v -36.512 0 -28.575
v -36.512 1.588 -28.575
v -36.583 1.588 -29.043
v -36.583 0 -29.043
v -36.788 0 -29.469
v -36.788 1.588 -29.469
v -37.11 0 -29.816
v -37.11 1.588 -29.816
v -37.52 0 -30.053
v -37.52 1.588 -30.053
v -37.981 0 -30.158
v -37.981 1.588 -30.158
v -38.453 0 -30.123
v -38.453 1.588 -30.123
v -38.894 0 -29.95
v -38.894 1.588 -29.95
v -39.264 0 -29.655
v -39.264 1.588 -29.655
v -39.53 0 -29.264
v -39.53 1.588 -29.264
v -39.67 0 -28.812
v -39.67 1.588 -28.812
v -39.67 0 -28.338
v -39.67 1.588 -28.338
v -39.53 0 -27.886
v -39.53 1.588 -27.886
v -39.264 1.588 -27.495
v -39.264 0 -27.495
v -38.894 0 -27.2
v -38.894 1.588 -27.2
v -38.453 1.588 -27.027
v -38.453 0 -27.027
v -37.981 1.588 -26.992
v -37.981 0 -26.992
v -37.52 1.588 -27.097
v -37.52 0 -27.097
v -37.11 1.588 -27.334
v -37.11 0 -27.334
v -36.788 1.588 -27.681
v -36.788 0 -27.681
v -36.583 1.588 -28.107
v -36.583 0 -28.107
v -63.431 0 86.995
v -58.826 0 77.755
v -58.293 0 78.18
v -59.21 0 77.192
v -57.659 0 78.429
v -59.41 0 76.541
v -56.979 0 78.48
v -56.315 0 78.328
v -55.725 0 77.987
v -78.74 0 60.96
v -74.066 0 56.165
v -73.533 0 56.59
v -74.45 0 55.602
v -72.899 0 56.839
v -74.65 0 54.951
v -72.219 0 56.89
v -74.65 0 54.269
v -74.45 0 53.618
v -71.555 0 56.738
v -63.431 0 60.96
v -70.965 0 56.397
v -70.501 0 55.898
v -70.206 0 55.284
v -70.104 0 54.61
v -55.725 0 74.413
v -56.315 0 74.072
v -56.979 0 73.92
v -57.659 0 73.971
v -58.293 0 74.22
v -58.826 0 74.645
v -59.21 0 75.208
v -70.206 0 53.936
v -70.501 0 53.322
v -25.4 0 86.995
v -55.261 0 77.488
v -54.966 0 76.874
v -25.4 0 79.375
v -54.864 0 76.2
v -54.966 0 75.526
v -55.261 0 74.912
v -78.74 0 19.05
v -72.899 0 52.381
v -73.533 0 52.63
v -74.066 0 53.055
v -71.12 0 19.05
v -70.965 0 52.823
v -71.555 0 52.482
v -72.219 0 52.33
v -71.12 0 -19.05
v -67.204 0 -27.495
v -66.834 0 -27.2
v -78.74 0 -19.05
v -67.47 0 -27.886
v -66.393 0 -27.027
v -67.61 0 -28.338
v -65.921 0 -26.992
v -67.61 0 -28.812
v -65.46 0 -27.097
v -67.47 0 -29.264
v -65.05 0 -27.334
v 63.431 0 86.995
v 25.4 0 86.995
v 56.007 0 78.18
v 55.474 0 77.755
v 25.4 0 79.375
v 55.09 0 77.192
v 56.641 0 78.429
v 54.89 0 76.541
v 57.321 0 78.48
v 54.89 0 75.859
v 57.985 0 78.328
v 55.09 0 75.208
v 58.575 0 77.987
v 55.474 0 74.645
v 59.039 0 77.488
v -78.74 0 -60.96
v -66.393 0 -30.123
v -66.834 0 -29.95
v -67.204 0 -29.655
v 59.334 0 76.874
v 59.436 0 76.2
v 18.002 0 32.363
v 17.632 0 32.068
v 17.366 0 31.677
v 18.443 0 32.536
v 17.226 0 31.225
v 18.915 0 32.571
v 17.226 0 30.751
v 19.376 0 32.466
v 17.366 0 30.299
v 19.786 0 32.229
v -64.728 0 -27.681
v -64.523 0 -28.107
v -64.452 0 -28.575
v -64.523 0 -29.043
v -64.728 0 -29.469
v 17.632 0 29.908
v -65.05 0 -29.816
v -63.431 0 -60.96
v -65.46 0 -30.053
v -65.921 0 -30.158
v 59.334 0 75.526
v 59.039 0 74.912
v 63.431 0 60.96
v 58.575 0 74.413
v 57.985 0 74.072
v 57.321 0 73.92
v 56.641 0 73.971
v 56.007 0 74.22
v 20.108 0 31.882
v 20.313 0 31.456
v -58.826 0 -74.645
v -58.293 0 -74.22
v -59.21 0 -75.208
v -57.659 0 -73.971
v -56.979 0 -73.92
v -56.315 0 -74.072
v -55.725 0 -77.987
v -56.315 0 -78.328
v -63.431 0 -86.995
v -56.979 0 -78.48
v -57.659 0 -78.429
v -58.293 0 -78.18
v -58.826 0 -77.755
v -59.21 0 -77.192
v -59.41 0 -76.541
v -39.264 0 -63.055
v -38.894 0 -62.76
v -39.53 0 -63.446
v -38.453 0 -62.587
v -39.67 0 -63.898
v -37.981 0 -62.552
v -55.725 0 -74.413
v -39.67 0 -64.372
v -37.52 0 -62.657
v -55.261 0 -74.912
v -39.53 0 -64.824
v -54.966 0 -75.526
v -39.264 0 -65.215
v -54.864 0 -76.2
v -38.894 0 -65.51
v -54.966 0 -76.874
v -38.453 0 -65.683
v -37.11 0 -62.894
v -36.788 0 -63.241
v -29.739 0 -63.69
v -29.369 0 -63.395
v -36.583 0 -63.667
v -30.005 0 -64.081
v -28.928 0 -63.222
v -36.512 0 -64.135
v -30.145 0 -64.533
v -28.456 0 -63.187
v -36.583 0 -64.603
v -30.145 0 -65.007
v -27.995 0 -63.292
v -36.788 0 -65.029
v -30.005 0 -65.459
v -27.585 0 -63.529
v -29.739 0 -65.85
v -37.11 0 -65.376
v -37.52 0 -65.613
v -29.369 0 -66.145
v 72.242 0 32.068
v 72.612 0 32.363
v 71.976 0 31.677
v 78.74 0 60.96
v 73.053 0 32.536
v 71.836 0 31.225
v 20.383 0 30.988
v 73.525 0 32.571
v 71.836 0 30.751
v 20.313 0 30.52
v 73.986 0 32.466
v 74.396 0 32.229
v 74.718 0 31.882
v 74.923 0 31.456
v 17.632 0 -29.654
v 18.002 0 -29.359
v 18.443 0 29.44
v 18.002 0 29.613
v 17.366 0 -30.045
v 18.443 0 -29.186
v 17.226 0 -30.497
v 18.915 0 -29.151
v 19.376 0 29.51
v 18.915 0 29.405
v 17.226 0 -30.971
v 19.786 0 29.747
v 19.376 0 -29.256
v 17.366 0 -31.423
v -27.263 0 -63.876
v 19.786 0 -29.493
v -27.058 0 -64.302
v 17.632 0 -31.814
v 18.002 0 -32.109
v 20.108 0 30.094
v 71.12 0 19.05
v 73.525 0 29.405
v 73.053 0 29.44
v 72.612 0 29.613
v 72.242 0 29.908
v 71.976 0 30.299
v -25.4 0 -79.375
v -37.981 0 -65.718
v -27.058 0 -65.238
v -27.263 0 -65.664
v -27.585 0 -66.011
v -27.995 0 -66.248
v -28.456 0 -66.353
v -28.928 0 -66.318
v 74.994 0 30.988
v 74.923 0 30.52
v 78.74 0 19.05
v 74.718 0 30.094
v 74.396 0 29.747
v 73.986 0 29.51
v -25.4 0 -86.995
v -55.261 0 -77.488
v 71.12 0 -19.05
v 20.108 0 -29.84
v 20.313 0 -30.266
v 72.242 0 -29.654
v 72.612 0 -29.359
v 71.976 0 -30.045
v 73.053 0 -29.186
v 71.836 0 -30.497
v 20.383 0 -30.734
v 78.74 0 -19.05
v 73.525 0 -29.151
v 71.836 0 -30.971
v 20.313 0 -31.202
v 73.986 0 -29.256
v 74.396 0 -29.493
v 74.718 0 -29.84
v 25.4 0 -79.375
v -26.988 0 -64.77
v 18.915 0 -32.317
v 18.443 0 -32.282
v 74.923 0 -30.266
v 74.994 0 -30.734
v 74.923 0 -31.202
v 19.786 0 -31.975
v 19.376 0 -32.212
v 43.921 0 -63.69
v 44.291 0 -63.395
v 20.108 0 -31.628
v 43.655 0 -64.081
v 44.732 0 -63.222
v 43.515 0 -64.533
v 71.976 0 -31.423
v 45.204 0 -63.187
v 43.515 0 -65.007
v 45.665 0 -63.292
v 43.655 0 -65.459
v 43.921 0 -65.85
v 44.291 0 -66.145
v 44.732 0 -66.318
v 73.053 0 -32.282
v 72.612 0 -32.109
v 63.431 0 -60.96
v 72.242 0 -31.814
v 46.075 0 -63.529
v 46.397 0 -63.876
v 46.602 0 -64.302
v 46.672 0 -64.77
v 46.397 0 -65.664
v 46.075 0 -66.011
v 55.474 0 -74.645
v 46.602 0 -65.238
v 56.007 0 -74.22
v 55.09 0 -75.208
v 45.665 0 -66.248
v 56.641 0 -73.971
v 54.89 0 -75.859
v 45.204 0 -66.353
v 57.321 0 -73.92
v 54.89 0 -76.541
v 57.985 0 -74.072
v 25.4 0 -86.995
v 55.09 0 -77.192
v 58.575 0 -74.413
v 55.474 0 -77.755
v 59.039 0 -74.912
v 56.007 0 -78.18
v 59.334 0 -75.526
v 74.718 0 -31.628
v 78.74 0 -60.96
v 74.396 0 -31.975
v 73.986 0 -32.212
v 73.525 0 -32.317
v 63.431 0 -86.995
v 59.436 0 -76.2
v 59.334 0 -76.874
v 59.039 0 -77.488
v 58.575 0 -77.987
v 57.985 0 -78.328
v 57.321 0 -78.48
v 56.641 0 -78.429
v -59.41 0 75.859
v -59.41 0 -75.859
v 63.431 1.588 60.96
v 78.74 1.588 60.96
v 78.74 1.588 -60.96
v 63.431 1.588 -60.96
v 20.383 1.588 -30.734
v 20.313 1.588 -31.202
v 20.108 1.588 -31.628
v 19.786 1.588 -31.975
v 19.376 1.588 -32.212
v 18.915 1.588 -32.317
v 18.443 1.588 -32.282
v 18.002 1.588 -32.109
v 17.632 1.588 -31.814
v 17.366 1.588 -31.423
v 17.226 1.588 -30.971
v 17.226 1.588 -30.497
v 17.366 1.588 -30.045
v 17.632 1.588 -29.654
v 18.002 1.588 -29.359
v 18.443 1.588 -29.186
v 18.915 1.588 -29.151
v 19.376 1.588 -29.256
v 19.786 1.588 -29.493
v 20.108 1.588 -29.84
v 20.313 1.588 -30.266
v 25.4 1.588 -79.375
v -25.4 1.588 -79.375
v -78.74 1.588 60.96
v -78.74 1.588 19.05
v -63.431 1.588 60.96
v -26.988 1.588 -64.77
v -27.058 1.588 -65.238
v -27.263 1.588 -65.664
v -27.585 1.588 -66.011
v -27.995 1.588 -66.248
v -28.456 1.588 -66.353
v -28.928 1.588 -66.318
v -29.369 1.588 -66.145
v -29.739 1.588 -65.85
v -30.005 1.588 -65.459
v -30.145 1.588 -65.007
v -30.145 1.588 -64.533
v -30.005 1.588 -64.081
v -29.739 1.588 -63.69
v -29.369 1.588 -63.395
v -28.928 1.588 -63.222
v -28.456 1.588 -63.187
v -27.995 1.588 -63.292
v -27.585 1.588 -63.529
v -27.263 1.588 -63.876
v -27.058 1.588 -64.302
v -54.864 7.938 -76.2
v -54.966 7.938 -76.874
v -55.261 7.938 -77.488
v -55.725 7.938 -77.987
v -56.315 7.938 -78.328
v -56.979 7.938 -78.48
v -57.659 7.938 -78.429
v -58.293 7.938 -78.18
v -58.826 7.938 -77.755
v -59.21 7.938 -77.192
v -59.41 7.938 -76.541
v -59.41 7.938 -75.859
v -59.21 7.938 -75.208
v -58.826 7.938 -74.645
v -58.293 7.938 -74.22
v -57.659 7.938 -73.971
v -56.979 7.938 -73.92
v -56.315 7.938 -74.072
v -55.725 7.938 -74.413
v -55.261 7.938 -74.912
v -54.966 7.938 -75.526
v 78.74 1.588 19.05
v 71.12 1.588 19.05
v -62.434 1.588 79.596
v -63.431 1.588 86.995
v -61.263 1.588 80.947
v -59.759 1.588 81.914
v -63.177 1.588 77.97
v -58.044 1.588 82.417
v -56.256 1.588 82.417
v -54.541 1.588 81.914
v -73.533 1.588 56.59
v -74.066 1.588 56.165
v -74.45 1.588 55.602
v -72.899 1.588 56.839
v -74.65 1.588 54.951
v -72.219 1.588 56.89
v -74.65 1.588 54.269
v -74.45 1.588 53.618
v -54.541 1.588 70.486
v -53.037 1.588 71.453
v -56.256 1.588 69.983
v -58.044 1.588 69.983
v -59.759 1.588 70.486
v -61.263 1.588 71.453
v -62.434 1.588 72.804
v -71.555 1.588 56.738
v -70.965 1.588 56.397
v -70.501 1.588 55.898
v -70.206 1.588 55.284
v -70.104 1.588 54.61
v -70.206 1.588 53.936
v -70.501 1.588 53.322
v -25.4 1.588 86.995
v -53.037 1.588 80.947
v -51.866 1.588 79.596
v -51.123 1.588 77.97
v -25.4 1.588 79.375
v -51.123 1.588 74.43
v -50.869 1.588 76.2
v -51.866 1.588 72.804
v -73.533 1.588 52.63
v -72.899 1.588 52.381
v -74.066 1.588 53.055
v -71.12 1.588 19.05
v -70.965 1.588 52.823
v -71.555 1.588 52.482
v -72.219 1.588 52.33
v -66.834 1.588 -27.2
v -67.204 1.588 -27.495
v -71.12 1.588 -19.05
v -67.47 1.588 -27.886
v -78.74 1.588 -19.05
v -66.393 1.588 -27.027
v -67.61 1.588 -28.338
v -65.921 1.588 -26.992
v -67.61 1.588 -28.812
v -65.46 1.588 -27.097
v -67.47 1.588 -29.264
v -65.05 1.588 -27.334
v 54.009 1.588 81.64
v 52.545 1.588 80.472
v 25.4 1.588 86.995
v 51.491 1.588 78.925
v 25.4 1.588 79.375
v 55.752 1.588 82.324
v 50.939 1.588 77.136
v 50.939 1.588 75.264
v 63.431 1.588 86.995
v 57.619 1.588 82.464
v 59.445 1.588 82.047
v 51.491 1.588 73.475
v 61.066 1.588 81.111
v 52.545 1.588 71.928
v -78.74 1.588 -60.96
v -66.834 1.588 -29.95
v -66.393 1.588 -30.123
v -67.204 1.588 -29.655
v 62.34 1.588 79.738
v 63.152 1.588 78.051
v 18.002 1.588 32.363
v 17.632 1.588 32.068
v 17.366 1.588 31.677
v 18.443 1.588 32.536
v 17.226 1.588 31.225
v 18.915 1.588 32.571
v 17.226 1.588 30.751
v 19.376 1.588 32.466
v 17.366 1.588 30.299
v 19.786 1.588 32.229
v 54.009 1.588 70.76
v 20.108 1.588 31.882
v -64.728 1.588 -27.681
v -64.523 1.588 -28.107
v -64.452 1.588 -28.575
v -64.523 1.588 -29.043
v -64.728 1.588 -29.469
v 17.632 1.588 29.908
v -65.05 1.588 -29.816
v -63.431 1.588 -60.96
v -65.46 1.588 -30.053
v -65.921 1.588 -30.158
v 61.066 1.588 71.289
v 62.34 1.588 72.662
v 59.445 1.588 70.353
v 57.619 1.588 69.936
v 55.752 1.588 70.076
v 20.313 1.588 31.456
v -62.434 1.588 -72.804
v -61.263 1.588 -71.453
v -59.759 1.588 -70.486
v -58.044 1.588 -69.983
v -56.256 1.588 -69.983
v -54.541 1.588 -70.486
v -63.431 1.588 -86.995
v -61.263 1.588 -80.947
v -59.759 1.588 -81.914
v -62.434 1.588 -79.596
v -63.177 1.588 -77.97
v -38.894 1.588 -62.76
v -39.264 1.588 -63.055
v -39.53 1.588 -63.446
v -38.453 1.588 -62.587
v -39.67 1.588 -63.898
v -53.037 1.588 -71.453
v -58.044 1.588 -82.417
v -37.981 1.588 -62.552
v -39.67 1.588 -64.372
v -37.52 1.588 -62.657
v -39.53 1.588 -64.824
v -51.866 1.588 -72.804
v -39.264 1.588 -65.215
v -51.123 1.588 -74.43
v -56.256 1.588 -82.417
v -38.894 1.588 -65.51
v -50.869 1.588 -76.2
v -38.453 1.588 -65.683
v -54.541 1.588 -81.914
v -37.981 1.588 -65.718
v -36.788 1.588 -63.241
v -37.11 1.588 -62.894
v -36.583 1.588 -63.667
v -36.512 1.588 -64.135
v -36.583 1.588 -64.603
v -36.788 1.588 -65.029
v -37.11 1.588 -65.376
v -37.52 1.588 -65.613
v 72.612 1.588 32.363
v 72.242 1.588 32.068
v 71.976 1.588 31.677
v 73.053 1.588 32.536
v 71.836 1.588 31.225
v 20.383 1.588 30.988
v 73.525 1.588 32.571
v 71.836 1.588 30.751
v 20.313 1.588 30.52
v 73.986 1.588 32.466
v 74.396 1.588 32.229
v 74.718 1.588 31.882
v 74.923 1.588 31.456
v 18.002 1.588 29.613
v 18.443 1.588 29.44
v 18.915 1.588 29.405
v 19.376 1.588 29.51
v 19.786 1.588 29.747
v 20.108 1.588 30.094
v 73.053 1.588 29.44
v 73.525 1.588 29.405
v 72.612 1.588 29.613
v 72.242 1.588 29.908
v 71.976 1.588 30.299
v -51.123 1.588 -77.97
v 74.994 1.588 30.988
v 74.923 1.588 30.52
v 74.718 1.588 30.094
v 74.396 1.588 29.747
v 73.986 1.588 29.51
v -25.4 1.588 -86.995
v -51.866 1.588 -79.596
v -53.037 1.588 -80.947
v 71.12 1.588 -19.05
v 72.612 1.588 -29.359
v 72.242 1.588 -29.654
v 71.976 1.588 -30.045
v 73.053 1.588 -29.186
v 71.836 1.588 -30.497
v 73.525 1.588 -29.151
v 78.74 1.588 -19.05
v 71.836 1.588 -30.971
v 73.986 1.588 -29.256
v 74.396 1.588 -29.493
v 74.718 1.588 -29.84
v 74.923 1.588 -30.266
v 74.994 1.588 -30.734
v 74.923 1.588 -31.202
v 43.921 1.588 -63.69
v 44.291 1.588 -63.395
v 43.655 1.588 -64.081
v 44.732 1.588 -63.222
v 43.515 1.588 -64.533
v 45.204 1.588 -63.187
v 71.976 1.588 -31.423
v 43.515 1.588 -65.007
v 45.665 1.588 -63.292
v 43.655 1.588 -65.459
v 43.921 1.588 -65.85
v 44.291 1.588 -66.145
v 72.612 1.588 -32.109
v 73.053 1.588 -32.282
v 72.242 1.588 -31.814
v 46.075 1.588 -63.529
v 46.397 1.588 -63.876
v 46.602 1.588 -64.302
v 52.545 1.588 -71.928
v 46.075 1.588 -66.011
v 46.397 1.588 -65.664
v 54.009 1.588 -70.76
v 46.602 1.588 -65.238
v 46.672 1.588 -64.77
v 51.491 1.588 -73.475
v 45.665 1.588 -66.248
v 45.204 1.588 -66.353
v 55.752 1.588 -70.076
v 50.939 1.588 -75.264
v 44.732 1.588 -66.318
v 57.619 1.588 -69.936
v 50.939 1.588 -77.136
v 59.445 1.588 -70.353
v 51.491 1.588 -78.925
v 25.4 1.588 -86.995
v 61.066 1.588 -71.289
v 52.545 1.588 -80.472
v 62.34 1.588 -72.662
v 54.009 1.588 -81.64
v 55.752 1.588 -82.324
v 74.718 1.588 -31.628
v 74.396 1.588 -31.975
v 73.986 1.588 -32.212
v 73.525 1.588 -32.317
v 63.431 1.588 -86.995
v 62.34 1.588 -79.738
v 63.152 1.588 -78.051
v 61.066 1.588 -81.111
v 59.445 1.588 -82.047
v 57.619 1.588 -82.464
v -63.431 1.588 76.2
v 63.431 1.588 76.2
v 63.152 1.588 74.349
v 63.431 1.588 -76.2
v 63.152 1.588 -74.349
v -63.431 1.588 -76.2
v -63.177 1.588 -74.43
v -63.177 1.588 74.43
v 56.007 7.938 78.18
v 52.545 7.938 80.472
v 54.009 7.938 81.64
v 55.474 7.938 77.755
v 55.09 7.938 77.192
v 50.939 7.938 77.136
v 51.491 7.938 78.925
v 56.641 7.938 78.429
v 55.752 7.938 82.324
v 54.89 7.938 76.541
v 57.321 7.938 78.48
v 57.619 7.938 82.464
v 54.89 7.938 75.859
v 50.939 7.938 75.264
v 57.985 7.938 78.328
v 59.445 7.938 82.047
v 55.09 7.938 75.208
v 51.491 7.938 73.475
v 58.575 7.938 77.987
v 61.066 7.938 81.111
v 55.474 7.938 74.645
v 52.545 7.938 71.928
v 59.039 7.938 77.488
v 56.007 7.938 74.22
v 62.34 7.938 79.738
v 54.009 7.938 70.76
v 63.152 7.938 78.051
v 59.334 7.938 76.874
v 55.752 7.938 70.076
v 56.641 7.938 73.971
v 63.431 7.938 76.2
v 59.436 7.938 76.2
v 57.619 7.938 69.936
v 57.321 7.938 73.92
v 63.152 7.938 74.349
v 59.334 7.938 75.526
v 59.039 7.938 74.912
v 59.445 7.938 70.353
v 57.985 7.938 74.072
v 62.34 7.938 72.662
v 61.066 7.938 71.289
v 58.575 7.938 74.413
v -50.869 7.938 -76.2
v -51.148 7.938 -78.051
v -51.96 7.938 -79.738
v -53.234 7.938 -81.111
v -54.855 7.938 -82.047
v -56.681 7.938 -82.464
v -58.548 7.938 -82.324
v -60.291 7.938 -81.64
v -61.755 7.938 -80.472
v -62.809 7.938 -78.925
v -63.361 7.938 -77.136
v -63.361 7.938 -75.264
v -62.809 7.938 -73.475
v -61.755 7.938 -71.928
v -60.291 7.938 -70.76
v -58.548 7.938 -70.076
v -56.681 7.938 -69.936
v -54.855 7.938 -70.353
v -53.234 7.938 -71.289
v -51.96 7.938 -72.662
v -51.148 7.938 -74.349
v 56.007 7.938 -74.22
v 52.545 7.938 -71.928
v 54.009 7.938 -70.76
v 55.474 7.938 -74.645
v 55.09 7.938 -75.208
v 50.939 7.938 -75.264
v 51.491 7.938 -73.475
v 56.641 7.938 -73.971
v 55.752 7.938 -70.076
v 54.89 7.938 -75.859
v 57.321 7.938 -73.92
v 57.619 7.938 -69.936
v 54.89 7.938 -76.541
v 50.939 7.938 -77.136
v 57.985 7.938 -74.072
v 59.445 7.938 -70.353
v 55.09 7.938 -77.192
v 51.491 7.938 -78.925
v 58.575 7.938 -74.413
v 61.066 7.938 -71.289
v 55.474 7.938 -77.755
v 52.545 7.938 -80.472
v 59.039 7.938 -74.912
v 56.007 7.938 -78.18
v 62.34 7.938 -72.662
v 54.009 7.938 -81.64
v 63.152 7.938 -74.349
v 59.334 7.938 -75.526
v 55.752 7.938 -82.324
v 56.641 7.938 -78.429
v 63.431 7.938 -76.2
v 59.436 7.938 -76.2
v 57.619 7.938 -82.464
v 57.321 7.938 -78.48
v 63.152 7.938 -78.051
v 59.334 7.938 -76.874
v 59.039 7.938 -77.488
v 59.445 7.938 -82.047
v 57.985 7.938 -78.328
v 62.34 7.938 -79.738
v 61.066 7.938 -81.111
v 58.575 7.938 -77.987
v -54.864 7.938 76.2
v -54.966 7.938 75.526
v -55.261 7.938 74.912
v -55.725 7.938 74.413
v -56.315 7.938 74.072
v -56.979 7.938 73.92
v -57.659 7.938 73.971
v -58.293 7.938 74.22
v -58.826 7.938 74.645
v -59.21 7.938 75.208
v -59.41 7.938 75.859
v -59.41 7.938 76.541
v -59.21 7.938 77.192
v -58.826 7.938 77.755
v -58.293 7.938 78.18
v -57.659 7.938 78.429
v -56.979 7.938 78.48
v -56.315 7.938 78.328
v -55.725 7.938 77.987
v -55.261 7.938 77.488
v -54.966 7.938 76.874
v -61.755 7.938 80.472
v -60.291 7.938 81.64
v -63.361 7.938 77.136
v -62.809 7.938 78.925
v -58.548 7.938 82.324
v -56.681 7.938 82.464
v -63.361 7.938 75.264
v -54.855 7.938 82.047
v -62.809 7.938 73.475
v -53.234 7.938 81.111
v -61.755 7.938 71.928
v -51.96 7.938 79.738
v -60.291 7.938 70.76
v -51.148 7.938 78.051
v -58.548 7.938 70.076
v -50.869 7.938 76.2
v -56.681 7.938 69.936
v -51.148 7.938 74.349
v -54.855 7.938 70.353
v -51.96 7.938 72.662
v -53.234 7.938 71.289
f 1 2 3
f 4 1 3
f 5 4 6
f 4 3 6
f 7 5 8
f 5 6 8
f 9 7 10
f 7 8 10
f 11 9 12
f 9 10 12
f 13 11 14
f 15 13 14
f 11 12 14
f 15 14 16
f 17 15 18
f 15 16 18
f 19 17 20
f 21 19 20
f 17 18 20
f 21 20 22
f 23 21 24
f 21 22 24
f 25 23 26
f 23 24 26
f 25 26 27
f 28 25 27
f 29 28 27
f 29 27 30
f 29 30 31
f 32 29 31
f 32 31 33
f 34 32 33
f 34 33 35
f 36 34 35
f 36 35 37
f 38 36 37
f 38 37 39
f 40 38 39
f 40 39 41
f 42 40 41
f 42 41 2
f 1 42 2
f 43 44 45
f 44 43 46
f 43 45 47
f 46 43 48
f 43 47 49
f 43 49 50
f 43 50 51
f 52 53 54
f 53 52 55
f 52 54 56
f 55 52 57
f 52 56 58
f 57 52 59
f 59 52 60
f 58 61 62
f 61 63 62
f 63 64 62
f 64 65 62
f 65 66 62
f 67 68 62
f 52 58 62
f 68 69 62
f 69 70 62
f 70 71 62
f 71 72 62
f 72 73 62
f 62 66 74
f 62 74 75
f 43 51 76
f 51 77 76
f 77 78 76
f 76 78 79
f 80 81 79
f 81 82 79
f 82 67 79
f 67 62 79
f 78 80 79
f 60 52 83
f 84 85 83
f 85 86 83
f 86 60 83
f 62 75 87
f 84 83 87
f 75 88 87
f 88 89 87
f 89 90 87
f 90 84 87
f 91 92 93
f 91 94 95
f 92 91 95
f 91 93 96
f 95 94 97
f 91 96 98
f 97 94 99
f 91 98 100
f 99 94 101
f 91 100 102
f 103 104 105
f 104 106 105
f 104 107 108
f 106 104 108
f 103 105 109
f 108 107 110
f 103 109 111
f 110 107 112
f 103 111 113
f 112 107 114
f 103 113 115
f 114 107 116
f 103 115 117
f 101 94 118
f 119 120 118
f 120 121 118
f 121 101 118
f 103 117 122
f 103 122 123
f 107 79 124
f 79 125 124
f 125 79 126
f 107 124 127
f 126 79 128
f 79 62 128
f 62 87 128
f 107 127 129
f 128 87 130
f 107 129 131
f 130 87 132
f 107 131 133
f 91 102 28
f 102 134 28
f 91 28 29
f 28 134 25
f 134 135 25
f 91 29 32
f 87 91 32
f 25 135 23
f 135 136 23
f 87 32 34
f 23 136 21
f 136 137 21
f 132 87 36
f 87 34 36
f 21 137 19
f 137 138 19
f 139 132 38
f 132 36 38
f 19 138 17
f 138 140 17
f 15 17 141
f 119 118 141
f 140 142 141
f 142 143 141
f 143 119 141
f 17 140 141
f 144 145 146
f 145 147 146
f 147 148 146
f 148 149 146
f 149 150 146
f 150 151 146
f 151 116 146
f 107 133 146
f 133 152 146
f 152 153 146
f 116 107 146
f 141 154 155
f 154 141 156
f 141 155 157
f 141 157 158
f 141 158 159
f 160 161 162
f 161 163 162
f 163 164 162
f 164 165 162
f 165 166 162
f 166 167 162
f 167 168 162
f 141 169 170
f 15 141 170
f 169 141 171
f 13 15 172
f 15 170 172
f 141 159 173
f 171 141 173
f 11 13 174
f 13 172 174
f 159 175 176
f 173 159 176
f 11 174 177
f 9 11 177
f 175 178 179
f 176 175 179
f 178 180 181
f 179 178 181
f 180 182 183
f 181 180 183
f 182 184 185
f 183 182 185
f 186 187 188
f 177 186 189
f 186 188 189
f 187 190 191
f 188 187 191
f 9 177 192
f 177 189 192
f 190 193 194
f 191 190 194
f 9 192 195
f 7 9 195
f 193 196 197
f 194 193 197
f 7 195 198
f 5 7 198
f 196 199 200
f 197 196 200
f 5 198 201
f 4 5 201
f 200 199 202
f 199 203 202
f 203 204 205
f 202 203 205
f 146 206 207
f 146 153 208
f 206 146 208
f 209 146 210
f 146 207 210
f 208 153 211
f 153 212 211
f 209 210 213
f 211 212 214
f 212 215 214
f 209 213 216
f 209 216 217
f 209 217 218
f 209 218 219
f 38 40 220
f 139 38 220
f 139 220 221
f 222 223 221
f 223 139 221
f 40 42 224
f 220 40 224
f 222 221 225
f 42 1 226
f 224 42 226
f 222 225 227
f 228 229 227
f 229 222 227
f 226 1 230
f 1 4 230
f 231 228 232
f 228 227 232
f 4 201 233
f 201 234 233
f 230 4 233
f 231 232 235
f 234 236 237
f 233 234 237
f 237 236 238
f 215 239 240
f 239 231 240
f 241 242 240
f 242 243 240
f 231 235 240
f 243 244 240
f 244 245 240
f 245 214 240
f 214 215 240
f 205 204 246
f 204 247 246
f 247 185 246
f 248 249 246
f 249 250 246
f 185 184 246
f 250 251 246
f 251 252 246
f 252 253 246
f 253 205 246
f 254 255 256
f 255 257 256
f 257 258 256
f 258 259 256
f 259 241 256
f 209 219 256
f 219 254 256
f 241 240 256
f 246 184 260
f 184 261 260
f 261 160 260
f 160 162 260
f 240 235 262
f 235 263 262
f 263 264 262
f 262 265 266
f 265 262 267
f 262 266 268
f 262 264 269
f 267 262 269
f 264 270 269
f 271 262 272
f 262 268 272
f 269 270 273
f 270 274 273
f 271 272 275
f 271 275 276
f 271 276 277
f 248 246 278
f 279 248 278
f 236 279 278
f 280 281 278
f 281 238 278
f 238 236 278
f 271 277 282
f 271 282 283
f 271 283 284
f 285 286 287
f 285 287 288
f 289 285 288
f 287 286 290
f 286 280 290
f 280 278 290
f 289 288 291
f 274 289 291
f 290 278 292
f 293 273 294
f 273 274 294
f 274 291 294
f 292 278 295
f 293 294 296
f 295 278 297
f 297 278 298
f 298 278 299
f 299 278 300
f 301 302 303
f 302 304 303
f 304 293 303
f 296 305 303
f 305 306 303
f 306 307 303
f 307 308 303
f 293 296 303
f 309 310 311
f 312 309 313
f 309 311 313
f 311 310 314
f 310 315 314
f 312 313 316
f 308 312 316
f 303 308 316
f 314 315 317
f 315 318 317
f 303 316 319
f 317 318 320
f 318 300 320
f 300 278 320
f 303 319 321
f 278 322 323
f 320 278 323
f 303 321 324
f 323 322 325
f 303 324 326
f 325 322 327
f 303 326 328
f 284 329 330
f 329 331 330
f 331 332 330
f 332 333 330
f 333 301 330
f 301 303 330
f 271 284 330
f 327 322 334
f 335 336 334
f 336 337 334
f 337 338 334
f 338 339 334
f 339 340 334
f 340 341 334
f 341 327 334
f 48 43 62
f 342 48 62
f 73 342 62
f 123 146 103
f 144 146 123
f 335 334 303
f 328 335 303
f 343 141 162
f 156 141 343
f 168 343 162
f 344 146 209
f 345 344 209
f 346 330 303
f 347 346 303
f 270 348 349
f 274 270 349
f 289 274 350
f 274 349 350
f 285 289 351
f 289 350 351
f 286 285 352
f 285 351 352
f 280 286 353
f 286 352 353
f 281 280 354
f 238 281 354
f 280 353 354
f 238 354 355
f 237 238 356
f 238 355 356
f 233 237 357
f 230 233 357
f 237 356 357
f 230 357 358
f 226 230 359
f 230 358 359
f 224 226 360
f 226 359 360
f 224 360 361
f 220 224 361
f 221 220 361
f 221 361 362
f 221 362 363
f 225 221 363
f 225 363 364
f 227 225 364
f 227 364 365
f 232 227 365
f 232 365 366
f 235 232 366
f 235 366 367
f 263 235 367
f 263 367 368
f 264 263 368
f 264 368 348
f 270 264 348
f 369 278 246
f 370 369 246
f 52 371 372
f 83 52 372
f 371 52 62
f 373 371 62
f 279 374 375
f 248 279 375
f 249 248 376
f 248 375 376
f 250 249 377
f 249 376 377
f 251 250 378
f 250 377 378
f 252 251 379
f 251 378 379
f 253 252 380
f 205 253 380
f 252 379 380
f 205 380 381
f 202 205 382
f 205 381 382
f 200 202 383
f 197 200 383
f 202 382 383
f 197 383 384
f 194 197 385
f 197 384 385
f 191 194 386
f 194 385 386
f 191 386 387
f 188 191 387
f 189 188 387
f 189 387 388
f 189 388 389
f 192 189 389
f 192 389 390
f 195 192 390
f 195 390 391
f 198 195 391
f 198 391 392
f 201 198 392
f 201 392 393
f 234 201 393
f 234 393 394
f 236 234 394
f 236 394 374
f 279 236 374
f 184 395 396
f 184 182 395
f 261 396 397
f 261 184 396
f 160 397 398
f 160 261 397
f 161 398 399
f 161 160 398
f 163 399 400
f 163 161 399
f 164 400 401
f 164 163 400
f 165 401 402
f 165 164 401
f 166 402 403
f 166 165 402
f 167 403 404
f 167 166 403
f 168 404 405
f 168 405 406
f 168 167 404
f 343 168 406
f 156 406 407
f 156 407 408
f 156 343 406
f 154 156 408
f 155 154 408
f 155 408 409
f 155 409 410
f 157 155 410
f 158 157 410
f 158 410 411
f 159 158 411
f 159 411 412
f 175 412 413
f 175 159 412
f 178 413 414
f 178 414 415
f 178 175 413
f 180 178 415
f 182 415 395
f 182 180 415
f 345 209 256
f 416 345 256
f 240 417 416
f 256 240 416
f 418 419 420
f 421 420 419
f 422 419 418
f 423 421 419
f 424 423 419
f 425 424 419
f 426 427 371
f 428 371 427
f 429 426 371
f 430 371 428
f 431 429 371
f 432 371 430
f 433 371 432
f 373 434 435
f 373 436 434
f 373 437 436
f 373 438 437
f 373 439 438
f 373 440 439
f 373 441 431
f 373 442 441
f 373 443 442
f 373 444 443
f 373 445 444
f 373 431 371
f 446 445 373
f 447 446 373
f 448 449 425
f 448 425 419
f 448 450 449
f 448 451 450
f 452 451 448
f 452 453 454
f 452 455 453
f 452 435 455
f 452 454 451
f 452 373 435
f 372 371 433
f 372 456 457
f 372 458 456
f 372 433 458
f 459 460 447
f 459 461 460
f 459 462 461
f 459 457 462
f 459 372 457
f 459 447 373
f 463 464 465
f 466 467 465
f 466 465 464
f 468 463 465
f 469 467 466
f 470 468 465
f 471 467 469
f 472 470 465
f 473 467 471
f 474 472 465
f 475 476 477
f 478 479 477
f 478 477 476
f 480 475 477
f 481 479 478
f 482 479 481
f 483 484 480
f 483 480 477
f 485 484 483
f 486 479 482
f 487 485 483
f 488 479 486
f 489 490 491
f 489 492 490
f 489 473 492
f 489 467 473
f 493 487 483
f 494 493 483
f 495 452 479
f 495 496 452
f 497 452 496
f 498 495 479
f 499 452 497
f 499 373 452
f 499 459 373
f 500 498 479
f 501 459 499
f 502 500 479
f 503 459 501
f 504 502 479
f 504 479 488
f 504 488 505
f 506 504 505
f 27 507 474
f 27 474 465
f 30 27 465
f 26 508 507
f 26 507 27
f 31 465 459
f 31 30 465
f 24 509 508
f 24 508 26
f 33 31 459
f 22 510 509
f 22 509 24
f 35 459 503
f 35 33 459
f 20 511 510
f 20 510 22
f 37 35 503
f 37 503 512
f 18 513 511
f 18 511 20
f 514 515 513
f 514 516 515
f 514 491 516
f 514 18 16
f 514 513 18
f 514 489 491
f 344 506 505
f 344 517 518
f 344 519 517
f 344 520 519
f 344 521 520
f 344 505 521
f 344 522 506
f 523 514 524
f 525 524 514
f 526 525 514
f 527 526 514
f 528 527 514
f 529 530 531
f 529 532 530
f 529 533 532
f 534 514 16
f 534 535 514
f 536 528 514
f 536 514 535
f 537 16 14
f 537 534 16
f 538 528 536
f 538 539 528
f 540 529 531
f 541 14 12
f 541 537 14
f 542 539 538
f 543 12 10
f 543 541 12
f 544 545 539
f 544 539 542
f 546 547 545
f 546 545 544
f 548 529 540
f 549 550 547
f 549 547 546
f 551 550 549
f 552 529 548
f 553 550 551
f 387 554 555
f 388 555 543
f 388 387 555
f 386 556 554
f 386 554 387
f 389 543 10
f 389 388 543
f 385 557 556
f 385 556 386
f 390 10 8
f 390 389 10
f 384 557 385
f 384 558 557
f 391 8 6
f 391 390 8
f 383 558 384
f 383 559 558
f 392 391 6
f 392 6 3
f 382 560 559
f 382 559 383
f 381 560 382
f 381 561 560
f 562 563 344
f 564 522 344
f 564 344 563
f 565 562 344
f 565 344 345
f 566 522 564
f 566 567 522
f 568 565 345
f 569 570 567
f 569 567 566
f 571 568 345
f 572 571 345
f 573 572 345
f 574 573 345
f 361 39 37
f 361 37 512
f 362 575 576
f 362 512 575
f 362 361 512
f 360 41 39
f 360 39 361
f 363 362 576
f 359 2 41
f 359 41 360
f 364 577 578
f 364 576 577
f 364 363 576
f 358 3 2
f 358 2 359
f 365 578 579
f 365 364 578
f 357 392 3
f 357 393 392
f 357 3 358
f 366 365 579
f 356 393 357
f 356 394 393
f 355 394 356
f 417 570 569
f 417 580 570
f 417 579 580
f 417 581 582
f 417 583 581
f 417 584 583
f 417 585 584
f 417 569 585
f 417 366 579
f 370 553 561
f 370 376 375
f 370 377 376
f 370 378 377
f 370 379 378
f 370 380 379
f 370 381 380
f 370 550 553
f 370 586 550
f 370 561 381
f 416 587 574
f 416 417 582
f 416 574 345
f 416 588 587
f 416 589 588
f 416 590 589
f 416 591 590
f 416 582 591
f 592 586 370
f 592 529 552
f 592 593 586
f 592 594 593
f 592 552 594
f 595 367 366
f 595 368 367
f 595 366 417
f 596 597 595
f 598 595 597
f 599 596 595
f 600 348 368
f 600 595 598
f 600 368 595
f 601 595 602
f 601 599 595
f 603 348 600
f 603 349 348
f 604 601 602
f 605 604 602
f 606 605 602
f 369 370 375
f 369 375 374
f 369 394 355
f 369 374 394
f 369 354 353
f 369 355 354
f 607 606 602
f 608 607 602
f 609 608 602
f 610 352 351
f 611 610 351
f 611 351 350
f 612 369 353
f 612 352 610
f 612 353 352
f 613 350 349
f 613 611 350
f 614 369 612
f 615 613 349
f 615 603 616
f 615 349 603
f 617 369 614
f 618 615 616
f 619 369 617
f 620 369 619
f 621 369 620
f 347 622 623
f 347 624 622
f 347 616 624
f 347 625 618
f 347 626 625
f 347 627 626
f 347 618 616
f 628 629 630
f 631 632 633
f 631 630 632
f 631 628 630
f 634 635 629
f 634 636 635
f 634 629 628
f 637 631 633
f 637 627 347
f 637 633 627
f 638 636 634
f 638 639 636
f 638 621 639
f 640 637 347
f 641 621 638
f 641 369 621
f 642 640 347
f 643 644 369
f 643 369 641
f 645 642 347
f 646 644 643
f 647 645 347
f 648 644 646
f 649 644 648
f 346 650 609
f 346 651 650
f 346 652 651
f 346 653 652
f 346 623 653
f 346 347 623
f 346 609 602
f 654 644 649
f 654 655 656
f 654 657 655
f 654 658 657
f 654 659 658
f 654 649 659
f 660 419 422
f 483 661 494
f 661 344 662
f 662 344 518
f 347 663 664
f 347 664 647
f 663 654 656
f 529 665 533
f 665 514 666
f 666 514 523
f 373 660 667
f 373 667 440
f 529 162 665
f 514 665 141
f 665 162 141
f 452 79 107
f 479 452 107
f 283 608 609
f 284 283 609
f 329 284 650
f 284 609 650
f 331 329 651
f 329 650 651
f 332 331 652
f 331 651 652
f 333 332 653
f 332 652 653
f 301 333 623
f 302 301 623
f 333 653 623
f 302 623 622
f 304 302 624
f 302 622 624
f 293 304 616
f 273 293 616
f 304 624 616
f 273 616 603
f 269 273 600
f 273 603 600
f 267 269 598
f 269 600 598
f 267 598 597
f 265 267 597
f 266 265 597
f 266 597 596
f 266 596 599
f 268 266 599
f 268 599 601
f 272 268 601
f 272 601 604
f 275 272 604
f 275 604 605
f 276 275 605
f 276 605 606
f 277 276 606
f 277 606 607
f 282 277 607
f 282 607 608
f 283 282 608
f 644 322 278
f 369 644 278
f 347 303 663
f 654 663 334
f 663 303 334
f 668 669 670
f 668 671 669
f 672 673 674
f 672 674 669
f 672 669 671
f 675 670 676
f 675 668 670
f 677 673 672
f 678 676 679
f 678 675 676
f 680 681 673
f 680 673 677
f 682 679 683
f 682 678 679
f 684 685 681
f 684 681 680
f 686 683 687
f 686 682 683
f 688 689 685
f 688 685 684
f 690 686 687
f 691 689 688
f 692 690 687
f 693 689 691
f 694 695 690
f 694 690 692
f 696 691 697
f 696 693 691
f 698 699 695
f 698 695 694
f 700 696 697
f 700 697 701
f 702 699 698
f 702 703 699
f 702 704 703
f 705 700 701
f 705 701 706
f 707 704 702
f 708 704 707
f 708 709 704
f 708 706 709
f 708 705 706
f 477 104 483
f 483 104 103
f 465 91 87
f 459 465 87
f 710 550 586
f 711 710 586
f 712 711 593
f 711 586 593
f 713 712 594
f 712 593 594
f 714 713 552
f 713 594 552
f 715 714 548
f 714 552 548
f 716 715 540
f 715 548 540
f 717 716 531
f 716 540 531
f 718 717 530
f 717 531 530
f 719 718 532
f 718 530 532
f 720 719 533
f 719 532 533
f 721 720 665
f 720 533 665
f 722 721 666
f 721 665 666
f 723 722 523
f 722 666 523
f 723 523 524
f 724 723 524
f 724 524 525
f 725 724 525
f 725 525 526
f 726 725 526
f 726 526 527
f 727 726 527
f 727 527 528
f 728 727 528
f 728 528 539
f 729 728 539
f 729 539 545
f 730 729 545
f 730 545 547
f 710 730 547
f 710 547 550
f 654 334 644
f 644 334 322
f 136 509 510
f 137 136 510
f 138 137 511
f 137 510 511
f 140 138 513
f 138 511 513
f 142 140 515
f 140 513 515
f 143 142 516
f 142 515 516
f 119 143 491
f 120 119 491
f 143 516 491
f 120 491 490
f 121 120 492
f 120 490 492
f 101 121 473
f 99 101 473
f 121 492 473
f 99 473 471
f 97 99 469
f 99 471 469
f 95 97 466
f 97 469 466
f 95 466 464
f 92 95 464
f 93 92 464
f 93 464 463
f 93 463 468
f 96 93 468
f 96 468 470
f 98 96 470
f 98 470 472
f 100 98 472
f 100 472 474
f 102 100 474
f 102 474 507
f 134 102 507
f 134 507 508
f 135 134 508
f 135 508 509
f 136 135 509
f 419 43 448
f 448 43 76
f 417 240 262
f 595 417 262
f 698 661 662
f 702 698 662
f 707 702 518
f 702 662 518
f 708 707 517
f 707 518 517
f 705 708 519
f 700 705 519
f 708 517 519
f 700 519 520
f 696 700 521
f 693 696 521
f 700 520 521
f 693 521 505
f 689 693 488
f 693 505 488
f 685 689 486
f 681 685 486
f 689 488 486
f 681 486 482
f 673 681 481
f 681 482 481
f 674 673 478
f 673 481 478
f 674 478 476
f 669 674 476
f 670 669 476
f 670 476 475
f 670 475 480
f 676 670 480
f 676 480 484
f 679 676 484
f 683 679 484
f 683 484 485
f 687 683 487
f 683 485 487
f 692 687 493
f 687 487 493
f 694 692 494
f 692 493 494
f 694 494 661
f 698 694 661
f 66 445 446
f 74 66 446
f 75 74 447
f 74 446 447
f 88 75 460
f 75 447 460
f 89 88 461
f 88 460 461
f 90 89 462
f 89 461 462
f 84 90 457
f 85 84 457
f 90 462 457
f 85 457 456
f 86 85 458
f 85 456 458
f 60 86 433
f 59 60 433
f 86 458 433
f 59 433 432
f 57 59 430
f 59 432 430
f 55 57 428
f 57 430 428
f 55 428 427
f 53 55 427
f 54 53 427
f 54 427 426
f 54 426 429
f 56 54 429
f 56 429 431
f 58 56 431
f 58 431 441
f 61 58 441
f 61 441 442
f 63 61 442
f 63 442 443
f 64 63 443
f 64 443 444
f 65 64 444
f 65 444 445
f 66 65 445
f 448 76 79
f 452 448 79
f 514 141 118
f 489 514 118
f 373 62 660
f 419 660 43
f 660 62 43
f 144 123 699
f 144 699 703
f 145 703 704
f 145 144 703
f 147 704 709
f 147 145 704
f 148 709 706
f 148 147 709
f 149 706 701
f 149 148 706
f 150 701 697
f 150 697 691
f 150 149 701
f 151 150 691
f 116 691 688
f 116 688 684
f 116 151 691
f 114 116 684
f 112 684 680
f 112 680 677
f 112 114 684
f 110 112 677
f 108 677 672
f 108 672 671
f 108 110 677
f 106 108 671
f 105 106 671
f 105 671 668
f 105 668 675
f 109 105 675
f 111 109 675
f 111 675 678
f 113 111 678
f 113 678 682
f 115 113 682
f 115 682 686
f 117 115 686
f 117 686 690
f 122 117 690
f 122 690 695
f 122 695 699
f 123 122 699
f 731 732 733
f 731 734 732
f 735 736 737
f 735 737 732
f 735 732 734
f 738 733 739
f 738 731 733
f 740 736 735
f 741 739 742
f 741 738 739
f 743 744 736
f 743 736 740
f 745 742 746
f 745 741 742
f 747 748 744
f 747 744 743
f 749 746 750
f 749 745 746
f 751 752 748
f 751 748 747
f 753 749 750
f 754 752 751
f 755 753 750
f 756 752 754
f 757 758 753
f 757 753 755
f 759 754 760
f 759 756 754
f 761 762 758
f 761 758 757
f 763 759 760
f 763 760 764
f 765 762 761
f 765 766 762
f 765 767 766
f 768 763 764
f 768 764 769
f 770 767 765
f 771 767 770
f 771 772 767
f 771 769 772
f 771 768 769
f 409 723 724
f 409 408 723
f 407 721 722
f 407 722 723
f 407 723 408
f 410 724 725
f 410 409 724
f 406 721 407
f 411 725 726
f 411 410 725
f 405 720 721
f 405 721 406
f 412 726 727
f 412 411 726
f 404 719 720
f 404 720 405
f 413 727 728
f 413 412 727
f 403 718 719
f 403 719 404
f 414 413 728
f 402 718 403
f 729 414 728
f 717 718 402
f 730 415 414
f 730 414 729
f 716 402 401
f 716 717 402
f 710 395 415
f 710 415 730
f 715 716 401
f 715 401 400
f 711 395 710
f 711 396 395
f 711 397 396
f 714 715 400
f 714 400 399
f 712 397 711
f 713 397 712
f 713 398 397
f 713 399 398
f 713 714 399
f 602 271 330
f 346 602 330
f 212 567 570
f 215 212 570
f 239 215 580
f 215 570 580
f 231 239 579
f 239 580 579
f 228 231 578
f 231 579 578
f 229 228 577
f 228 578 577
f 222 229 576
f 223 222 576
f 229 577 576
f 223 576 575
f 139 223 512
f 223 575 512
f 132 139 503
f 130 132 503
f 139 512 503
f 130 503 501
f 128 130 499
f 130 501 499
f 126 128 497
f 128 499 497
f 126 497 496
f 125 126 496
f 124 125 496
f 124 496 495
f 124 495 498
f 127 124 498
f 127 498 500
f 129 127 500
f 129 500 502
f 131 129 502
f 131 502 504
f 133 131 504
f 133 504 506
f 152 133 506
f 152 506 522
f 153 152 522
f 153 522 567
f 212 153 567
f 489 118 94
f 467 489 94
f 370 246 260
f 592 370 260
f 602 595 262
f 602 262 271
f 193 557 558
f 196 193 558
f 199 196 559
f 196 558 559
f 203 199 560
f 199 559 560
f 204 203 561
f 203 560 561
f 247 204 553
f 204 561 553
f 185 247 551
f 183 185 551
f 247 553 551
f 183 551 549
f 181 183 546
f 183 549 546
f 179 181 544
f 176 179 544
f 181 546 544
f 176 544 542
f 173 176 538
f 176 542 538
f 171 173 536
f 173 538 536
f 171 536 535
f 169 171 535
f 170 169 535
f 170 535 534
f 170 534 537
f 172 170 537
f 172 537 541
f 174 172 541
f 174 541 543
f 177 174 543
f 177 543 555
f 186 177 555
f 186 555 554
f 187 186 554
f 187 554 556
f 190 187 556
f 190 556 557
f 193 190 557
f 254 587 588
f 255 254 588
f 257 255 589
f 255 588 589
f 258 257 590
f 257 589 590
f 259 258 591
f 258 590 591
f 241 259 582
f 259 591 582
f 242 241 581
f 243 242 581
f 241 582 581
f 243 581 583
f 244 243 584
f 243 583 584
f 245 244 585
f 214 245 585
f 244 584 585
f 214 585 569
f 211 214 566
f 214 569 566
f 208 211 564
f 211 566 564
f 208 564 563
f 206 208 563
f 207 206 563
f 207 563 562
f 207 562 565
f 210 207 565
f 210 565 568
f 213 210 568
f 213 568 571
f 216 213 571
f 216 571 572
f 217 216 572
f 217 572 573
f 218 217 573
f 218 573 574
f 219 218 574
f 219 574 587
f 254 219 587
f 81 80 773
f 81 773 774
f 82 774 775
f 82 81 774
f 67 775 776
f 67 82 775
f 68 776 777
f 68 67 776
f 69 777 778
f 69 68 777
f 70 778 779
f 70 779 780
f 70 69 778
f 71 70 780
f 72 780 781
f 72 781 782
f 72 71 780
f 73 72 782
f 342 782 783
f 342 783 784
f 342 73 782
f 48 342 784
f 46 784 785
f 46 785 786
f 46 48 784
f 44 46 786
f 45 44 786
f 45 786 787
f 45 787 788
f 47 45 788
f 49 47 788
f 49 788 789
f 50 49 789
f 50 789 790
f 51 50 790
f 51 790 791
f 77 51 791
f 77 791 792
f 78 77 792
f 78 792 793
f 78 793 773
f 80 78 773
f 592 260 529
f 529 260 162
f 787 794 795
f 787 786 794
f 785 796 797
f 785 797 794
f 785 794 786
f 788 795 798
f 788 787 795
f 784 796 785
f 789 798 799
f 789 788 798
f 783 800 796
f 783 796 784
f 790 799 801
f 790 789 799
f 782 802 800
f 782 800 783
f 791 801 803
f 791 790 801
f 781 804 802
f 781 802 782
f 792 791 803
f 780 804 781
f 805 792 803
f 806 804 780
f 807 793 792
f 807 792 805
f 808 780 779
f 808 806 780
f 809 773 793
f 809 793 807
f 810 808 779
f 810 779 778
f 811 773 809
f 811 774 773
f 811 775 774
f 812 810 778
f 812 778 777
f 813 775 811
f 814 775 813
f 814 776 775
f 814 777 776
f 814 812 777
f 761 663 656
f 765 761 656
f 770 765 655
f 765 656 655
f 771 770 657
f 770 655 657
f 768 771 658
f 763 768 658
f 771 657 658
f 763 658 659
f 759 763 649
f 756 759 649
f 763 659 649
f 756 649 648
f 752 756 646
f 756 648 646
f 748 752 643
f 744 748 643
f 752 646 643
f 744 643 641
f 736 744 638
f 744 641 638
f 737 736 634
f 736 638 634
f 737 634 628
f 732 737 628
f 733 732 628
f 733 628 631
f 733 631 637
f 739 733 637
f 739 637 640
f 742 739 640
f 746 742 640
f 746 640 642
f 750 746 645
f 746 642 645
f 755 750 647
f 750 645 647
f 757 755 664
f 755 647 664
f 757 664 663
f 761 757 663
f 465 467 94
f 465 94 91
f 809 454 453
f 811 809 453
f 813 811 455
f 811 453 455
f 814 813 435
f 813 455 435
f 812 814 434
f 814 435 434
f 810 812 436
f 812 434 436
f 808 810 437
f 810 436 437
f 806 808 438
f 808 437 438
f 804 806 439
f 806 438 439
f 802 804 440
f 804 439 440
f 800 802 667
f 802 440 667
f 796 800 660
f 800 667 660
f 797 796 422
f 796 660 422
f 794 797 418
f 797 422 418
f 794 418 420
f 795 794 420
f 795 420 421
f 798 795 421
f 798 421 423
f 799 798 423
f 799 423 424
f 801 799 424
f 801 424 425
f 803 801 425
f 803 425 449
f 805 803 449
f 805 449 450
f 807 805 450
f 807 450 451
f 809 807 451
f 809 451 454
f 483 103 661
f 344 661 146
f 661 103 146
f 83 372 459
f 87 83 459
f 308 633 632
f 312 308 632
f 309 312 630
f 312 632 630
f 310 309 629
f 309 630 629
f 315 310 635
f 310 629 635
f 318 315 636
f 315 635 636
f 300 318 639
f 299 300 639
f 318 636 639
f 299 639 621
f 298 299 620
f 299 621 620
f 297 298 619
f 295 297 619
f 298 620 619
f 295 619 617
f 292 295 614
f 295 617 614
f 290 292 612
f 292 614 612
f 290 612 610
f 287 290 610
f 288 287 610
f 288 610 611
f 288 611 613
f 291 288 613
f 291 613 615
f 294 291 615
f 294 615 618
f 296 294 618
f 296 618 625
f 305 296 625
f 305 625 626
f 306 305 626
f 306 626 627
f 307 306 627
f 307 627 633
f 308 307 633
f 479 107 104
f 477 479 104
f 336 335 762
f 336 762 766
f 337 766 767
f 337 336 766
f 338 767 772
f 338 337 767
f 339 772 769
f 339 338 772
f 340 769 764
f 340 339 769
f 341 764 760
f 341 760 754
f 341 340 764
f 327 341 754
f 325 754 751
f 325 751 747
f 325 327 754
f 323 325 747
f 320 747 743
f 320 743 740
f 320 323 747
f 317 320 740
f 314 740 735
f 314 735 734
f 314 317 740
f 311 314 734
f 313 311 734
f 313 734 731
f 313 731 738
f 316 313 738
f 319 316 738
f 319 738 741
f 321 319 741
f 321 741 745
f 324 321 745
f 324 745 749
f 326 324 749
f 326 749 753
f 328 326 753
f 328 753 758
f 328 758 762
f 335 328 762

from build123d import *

# Parameters (mm, degrees)
SKETCH1_R            = 2.286
MAIN_BODY_DEPTH      = 1.5875
SKETCH13_R           = 6.28142
SKETCH13_R_2         = 2.286
BOSS_EXTRUDE9_DEPTH  = 6.35
CUT_EXTRUDE3_REACH   = 3.587
SKETCH5_R            = 1.5875
SKETCH5_R_2          = 2.286
SKETCH14_W           = 7.62
SKETCH14_H           = 6.35
BOSS_EXTRUDE10_DEPTH = 1.5875


with BuildPart() as part:
    # Sketch1 → Main Body (new body)
    with BuildSketch(Plane(origin=(0, 0, 0), x_dir=(1, 0, 0), z_dir=(0, 1, 0))):
        Polygon((-25.4, 86.995), (-63.43142, 86.995), (-63.43142, 60.96), (-78.74, 60.96), (-78.74, 25.4), (-71.12, 25.4), (-71.12, -25.4), (-78.74, -25.4), (-78.74, -60.96), (-63.43142, -60.96), (-63.43142, -86.995), (-25.4, -86.995), (-25.4, -79.375), (25.4, -79.375), (25.4, -86.995), (63.43142, -86.995), (63.43142, -60.96), (78.74, -60.96), (78.74, -25.4), (71.12, -25.4), (71.12, 25.4), (78.74, 25.4), (78.74, 60.96), (63.43142, 60.96), (63.43142, 86.995), (25.4, 86.995), (25.4, 79.375), (-25.4, 79.375), align=None)
        with Locations((-57.15, 76.2)):
            Circle(SKETCH1_R, mode=Mode.SUBTRACT)
        with Locations((57.15, 76.2)):
            Circle(SKETCH1_R, mode=Mode.SUBTRACT)
        with Locations((57.15, -76.2)):
            Circle(SKETCH1_R, mode=Mode.SUBTRACT)
        with Locations((-57.15, -76.2)):
            Circle(SKETCH1_R, mode=Mode.SUBTRACT)
    extrude(amount=MAIN_BODY_DEPTH)

    # Sketch13 → Boss-Extrude9 (add)
    with BuildSketch(Plane(origin=(0, 1.5875, 0), x_dir=(1, 0, 0), z_dir=(0, 1, 0))):
        with Locations((-57.15, 76.2)):
            Circle(SKETCH13_R)
        with Locations((-57.15, 76.2)):
            Circle(SKETCH13_R_2, mode=Mode.SUBTRACT)
        with Locations((-57.15, -76.2)):
            Circle(SKETCH13_R)
        with Locations((-57.15, -76.2)):
            Circle(SKETCH13_R_2, mode=Mode.SUBTRACT)
        with Locations((57.15, -76.2)):
            Circle(SKETCH13_R)
        with Locations((57.15, -76.2)):
            Circle(SKETCH13_R_2, mode=Mode.SUBTRACT)
        with Locations((57.15, 76.2)):
            Circle(SKETCH13_R)
        with Locations((57.15, 76.2)):
            Circle(SKETCH13_R_2, mode=Mode.SUBTRACT)
    extrude(amount=BOSS_EXTRUDE9_DEPTH)

    # Sketch5 → Cut-Extrude3 (cut, up to next)
    with BuildSketch(Plane(origin=(0, 1.5875, 0), x_dir=(1, 0, 0), z_dir=(0, 1, 0)), mode=Mode.PRIVATE) as cut_extrude3_sk1:
        with Locations((18.796, 30.734)):
            Circle(SKETCH5_R)
    cut_extrude3_tool1 = extrude(cut_extrude3_sk1.sketch, amount=-CUT_EXTRUDE3_REACH, mode=Mode.PRIVATE) & part.part
    add(cut_extrude3_tool1.solids().sort_by_distance((18.796, 1.5875, -30.734))[0], mode=Mode.SUBTRACT)
    # Sketch5 → Cut-Extrude3 (cut, up to next)
    with BuildSketch(Plane(origin=(0, 1.5875, 0), x_dir=(1, 0, 0), z_dir=(0, 1, 0)), mode=Mode.PRIVATE) as cut_extrude3_sk2:
        with Locations((73.406, 30.734)):
            Circle(SKETCH5_R)
    cut_extrude3_tool2 = extrude(cut_extrude3_sk2.sketch, amount=-CUT_EXTRUDE3_REACH, mode=Mode.PRIVATE) & part.part
    add(cut_extrude3_tool2.solids().sort_by_distance((73.406, 1.5875, -30.734))[0], mode=Mode.SUBTRACT)
    # Sketch5 → Cut-Extrude3 (cut, up to next)
    with BuildSketch(Plane(origin=(0, 1.5875, 0), x_dir=(1, 0, 0), z_dir=(0, 1, 0)), mode=Mode.PRIVATE) as cut_extrude3_sk3:
        with Locations((73.406, -30.988)):
            Circle(SKETCH5_R)
    cut_extrude3_tool3 = extrude(cut_extrude3_sk3.sketch, amount=-CUT_EXTRUDE3_REACH, mode=Mode.PRIVATE) & part.part
    add(cut_extrude3_tool3.solids().sort_by_distance((73.406, 1.5875, 30.988))[0], mode=Mode.SUBTRACT)
    # Sketch5 → Cut-Extrude3 (cut, up to next)
    with BuildSketch(Plane(origin=(0, 1.5875, 0), x_dir=(1, 0, 0), z_dir=(0, 1, 0)), mode=Mode.PRIVATE) as cut_extrude3_sk4:
        with Locations((18.796, -30.988)):
            Circle(SKETCH5_R)
    cut_extrude3_tool4 = extrude(cut_extrude3_sk4.sketch, amount=-CUT_EXTRUDE3_REACH, mode=Mode.PRIVATE) & part.part
    add(cut_extrude3_tool4.solids().sort_by_distance((18.796, 1.5875, 30.988))[0], mode=Mode.SUBTRACT)
    # Sketch5 → Cut-Extrude3 (cut, up to next)
    with BuildSketch(Plane(origin=(0, 1.5875, 0), x_dir=(1, 0, 0), z_dir=(0, 1, 0)), mode=Mode.PRIVATE) as cut_extrude3_sk5:
        with Locations((-28.575, 64.77)):
            Circle(SKETCH5_R)
    cut_extrude3_tool5 = extrude(cut_extrude3_sk5.sketch, amount=-CUT_EXTRUDE3_REACH, mode=Mode.PRIVATE) & part.part
    add(cut_extrude3_tool5.solids().sort_by_distance((-28.575, 1.5875, -64.77))[0], mode=Mode.SUBTRACT)
    # Sketch5 → Cut-Extrude3 (cut, up to next)
    with BuildSketch(Plane(origin=(0, 1.5875, 0), x_dir=(1, 0, 0), z_dir=(0, 1, 0)), mode=Mode.PRIVATE) as cut_extrude3_sk6:
        with Locations((45.085, 64.77)):
            Circle(SKETCH5_R)
    cut_extrude3_tool6 = extrude(cut_extrude3_sk6.sketch, amount=-CUT_EXTRUDE3_REACH, mode=Mode.PRIVATE) & part.part
    add(cut_extrude3_tool6.solids().sort_by_distance((45.085, 1.5875, -64.77))[0], mode=Mode.SUBTRACT)
    # Sketch5 → Cut-Extrude3 (cut, up to next)
    with BuildSketch(Plane(origin=(0, 1.5875, 0), x_dir=(1, 0, 0), z_dir=(0, 1, 0)), mode=Mode.PRIVATE) as cut_extrude3_sk7:
        with Locations((-66.04, 28.575)):
            Circle(SKETCH5_R)
    cut_extrude3_tool7 = extrude(cut_extrude3_sk7.sketch, amount=-CUT_EXTRUDE3_REACH, mode=Mode.PRIVATE) & part.part
    add(cut_extrude3_tool7.solids().sort_by_distance((-66.04, 1.5875, -28.575))[0], mode=Mode.SUBTRACT)
    # Sketch5 → Cut-Extrude3 (cut, up to next)
    with BuildSketch(Plane(origin=(0, 1.5875, 0), x_dir=(1, 0, 0), z_dir=(0, 1, 0)), mode=Mode.PRIVATE) as cut_extrude3_sk8:
        with Locations((-38.1, 64.135)):
            Circle(SKETCH5_R)
    cut_extrude3_tool8 = extrude(cut_extrude3_sk8.sketch, amount=-CUT_EXTRUDE3_REACH, mode=Mode.PRIVATE) & part.part
    add(cut_extrude3_tool8.solids().sort_by_distance((-38.1, 1.5875, -64.135))[0], mode=Mode.SUBTRACT)
    # Sketch5 → Cut-Extrude3 (cut, up to next)
    with BuildSketch(Plane(origin=(0, 1.5875, 0), x_dir=(1, 0, 0), z_dir=(0, 1, 0)), mode=Mode.PRIVATE) as cut_extrude3_sk9:
        with Locations((-38.1, 28.575)):
            Circle(SKETCH5_R)
    cut_extrude3_tool9 = extrude(cut_extrude3_sk9.sketch, amount=-CUT_EXTRUDE3_REACH, mode=Mode.PRIVATE) & part.part
    add(cut_extrude3_tool9.solids().sort_by_distance((-38.1, 1.5875, -28.575))[0], mode=Mode.SUBTRACT)
    # Sketch5 → Cut-Extrude3 (cut, up to next)
    with BuildSketch(Plane(origin=(0, 1.5875, 0), x_dir=(1, 0, 0), z_dir=(0, 1, 0)), mode=Mode.PRIVATE) as cut_extrude3_sk10:
        with Locations((-72.39, -54.61)):
            Circle(SKETCH5_R_2)
    cut_extrude3_tool10 = extrude(cut_extrude3_sk10.sketch, amount=-CUT_EXTRUDE3_REACH, mode=Mode.PRIVATE) & part.part
    add(cut_extrude3_tool10.solids().sort_by_distance((-72.39, 1.5875, 54.61))[0], mode=Mode.SUBTRACT)

    # Sketch14 → Boss-Extrude10 (add)
    with BuildSketch(Plane(origin=(0, 1.5875, 0), x_dir=(1, 0, 0), z_dir=(0, 1, 0))):
        with Locations((-74.93, -22.225)):
            Rectangle(SKETCH14_W, SKETCH14_H)
        with Locations((-74.93, 22.225)):
            Rectangle(SKETCH14_W, SKETCH14_H)
        with Locations((74.93, -22.225)):
            Rectangle(SKETCH14_W, SKETCH14_H)
        with Locations((74.93, 22.225)):
            Rectangle(SKETCH14_W, SKETCH14_H)
    extrude(amount=-BOSS_EXTRUDE10_DEPTH)


solid = part.part
